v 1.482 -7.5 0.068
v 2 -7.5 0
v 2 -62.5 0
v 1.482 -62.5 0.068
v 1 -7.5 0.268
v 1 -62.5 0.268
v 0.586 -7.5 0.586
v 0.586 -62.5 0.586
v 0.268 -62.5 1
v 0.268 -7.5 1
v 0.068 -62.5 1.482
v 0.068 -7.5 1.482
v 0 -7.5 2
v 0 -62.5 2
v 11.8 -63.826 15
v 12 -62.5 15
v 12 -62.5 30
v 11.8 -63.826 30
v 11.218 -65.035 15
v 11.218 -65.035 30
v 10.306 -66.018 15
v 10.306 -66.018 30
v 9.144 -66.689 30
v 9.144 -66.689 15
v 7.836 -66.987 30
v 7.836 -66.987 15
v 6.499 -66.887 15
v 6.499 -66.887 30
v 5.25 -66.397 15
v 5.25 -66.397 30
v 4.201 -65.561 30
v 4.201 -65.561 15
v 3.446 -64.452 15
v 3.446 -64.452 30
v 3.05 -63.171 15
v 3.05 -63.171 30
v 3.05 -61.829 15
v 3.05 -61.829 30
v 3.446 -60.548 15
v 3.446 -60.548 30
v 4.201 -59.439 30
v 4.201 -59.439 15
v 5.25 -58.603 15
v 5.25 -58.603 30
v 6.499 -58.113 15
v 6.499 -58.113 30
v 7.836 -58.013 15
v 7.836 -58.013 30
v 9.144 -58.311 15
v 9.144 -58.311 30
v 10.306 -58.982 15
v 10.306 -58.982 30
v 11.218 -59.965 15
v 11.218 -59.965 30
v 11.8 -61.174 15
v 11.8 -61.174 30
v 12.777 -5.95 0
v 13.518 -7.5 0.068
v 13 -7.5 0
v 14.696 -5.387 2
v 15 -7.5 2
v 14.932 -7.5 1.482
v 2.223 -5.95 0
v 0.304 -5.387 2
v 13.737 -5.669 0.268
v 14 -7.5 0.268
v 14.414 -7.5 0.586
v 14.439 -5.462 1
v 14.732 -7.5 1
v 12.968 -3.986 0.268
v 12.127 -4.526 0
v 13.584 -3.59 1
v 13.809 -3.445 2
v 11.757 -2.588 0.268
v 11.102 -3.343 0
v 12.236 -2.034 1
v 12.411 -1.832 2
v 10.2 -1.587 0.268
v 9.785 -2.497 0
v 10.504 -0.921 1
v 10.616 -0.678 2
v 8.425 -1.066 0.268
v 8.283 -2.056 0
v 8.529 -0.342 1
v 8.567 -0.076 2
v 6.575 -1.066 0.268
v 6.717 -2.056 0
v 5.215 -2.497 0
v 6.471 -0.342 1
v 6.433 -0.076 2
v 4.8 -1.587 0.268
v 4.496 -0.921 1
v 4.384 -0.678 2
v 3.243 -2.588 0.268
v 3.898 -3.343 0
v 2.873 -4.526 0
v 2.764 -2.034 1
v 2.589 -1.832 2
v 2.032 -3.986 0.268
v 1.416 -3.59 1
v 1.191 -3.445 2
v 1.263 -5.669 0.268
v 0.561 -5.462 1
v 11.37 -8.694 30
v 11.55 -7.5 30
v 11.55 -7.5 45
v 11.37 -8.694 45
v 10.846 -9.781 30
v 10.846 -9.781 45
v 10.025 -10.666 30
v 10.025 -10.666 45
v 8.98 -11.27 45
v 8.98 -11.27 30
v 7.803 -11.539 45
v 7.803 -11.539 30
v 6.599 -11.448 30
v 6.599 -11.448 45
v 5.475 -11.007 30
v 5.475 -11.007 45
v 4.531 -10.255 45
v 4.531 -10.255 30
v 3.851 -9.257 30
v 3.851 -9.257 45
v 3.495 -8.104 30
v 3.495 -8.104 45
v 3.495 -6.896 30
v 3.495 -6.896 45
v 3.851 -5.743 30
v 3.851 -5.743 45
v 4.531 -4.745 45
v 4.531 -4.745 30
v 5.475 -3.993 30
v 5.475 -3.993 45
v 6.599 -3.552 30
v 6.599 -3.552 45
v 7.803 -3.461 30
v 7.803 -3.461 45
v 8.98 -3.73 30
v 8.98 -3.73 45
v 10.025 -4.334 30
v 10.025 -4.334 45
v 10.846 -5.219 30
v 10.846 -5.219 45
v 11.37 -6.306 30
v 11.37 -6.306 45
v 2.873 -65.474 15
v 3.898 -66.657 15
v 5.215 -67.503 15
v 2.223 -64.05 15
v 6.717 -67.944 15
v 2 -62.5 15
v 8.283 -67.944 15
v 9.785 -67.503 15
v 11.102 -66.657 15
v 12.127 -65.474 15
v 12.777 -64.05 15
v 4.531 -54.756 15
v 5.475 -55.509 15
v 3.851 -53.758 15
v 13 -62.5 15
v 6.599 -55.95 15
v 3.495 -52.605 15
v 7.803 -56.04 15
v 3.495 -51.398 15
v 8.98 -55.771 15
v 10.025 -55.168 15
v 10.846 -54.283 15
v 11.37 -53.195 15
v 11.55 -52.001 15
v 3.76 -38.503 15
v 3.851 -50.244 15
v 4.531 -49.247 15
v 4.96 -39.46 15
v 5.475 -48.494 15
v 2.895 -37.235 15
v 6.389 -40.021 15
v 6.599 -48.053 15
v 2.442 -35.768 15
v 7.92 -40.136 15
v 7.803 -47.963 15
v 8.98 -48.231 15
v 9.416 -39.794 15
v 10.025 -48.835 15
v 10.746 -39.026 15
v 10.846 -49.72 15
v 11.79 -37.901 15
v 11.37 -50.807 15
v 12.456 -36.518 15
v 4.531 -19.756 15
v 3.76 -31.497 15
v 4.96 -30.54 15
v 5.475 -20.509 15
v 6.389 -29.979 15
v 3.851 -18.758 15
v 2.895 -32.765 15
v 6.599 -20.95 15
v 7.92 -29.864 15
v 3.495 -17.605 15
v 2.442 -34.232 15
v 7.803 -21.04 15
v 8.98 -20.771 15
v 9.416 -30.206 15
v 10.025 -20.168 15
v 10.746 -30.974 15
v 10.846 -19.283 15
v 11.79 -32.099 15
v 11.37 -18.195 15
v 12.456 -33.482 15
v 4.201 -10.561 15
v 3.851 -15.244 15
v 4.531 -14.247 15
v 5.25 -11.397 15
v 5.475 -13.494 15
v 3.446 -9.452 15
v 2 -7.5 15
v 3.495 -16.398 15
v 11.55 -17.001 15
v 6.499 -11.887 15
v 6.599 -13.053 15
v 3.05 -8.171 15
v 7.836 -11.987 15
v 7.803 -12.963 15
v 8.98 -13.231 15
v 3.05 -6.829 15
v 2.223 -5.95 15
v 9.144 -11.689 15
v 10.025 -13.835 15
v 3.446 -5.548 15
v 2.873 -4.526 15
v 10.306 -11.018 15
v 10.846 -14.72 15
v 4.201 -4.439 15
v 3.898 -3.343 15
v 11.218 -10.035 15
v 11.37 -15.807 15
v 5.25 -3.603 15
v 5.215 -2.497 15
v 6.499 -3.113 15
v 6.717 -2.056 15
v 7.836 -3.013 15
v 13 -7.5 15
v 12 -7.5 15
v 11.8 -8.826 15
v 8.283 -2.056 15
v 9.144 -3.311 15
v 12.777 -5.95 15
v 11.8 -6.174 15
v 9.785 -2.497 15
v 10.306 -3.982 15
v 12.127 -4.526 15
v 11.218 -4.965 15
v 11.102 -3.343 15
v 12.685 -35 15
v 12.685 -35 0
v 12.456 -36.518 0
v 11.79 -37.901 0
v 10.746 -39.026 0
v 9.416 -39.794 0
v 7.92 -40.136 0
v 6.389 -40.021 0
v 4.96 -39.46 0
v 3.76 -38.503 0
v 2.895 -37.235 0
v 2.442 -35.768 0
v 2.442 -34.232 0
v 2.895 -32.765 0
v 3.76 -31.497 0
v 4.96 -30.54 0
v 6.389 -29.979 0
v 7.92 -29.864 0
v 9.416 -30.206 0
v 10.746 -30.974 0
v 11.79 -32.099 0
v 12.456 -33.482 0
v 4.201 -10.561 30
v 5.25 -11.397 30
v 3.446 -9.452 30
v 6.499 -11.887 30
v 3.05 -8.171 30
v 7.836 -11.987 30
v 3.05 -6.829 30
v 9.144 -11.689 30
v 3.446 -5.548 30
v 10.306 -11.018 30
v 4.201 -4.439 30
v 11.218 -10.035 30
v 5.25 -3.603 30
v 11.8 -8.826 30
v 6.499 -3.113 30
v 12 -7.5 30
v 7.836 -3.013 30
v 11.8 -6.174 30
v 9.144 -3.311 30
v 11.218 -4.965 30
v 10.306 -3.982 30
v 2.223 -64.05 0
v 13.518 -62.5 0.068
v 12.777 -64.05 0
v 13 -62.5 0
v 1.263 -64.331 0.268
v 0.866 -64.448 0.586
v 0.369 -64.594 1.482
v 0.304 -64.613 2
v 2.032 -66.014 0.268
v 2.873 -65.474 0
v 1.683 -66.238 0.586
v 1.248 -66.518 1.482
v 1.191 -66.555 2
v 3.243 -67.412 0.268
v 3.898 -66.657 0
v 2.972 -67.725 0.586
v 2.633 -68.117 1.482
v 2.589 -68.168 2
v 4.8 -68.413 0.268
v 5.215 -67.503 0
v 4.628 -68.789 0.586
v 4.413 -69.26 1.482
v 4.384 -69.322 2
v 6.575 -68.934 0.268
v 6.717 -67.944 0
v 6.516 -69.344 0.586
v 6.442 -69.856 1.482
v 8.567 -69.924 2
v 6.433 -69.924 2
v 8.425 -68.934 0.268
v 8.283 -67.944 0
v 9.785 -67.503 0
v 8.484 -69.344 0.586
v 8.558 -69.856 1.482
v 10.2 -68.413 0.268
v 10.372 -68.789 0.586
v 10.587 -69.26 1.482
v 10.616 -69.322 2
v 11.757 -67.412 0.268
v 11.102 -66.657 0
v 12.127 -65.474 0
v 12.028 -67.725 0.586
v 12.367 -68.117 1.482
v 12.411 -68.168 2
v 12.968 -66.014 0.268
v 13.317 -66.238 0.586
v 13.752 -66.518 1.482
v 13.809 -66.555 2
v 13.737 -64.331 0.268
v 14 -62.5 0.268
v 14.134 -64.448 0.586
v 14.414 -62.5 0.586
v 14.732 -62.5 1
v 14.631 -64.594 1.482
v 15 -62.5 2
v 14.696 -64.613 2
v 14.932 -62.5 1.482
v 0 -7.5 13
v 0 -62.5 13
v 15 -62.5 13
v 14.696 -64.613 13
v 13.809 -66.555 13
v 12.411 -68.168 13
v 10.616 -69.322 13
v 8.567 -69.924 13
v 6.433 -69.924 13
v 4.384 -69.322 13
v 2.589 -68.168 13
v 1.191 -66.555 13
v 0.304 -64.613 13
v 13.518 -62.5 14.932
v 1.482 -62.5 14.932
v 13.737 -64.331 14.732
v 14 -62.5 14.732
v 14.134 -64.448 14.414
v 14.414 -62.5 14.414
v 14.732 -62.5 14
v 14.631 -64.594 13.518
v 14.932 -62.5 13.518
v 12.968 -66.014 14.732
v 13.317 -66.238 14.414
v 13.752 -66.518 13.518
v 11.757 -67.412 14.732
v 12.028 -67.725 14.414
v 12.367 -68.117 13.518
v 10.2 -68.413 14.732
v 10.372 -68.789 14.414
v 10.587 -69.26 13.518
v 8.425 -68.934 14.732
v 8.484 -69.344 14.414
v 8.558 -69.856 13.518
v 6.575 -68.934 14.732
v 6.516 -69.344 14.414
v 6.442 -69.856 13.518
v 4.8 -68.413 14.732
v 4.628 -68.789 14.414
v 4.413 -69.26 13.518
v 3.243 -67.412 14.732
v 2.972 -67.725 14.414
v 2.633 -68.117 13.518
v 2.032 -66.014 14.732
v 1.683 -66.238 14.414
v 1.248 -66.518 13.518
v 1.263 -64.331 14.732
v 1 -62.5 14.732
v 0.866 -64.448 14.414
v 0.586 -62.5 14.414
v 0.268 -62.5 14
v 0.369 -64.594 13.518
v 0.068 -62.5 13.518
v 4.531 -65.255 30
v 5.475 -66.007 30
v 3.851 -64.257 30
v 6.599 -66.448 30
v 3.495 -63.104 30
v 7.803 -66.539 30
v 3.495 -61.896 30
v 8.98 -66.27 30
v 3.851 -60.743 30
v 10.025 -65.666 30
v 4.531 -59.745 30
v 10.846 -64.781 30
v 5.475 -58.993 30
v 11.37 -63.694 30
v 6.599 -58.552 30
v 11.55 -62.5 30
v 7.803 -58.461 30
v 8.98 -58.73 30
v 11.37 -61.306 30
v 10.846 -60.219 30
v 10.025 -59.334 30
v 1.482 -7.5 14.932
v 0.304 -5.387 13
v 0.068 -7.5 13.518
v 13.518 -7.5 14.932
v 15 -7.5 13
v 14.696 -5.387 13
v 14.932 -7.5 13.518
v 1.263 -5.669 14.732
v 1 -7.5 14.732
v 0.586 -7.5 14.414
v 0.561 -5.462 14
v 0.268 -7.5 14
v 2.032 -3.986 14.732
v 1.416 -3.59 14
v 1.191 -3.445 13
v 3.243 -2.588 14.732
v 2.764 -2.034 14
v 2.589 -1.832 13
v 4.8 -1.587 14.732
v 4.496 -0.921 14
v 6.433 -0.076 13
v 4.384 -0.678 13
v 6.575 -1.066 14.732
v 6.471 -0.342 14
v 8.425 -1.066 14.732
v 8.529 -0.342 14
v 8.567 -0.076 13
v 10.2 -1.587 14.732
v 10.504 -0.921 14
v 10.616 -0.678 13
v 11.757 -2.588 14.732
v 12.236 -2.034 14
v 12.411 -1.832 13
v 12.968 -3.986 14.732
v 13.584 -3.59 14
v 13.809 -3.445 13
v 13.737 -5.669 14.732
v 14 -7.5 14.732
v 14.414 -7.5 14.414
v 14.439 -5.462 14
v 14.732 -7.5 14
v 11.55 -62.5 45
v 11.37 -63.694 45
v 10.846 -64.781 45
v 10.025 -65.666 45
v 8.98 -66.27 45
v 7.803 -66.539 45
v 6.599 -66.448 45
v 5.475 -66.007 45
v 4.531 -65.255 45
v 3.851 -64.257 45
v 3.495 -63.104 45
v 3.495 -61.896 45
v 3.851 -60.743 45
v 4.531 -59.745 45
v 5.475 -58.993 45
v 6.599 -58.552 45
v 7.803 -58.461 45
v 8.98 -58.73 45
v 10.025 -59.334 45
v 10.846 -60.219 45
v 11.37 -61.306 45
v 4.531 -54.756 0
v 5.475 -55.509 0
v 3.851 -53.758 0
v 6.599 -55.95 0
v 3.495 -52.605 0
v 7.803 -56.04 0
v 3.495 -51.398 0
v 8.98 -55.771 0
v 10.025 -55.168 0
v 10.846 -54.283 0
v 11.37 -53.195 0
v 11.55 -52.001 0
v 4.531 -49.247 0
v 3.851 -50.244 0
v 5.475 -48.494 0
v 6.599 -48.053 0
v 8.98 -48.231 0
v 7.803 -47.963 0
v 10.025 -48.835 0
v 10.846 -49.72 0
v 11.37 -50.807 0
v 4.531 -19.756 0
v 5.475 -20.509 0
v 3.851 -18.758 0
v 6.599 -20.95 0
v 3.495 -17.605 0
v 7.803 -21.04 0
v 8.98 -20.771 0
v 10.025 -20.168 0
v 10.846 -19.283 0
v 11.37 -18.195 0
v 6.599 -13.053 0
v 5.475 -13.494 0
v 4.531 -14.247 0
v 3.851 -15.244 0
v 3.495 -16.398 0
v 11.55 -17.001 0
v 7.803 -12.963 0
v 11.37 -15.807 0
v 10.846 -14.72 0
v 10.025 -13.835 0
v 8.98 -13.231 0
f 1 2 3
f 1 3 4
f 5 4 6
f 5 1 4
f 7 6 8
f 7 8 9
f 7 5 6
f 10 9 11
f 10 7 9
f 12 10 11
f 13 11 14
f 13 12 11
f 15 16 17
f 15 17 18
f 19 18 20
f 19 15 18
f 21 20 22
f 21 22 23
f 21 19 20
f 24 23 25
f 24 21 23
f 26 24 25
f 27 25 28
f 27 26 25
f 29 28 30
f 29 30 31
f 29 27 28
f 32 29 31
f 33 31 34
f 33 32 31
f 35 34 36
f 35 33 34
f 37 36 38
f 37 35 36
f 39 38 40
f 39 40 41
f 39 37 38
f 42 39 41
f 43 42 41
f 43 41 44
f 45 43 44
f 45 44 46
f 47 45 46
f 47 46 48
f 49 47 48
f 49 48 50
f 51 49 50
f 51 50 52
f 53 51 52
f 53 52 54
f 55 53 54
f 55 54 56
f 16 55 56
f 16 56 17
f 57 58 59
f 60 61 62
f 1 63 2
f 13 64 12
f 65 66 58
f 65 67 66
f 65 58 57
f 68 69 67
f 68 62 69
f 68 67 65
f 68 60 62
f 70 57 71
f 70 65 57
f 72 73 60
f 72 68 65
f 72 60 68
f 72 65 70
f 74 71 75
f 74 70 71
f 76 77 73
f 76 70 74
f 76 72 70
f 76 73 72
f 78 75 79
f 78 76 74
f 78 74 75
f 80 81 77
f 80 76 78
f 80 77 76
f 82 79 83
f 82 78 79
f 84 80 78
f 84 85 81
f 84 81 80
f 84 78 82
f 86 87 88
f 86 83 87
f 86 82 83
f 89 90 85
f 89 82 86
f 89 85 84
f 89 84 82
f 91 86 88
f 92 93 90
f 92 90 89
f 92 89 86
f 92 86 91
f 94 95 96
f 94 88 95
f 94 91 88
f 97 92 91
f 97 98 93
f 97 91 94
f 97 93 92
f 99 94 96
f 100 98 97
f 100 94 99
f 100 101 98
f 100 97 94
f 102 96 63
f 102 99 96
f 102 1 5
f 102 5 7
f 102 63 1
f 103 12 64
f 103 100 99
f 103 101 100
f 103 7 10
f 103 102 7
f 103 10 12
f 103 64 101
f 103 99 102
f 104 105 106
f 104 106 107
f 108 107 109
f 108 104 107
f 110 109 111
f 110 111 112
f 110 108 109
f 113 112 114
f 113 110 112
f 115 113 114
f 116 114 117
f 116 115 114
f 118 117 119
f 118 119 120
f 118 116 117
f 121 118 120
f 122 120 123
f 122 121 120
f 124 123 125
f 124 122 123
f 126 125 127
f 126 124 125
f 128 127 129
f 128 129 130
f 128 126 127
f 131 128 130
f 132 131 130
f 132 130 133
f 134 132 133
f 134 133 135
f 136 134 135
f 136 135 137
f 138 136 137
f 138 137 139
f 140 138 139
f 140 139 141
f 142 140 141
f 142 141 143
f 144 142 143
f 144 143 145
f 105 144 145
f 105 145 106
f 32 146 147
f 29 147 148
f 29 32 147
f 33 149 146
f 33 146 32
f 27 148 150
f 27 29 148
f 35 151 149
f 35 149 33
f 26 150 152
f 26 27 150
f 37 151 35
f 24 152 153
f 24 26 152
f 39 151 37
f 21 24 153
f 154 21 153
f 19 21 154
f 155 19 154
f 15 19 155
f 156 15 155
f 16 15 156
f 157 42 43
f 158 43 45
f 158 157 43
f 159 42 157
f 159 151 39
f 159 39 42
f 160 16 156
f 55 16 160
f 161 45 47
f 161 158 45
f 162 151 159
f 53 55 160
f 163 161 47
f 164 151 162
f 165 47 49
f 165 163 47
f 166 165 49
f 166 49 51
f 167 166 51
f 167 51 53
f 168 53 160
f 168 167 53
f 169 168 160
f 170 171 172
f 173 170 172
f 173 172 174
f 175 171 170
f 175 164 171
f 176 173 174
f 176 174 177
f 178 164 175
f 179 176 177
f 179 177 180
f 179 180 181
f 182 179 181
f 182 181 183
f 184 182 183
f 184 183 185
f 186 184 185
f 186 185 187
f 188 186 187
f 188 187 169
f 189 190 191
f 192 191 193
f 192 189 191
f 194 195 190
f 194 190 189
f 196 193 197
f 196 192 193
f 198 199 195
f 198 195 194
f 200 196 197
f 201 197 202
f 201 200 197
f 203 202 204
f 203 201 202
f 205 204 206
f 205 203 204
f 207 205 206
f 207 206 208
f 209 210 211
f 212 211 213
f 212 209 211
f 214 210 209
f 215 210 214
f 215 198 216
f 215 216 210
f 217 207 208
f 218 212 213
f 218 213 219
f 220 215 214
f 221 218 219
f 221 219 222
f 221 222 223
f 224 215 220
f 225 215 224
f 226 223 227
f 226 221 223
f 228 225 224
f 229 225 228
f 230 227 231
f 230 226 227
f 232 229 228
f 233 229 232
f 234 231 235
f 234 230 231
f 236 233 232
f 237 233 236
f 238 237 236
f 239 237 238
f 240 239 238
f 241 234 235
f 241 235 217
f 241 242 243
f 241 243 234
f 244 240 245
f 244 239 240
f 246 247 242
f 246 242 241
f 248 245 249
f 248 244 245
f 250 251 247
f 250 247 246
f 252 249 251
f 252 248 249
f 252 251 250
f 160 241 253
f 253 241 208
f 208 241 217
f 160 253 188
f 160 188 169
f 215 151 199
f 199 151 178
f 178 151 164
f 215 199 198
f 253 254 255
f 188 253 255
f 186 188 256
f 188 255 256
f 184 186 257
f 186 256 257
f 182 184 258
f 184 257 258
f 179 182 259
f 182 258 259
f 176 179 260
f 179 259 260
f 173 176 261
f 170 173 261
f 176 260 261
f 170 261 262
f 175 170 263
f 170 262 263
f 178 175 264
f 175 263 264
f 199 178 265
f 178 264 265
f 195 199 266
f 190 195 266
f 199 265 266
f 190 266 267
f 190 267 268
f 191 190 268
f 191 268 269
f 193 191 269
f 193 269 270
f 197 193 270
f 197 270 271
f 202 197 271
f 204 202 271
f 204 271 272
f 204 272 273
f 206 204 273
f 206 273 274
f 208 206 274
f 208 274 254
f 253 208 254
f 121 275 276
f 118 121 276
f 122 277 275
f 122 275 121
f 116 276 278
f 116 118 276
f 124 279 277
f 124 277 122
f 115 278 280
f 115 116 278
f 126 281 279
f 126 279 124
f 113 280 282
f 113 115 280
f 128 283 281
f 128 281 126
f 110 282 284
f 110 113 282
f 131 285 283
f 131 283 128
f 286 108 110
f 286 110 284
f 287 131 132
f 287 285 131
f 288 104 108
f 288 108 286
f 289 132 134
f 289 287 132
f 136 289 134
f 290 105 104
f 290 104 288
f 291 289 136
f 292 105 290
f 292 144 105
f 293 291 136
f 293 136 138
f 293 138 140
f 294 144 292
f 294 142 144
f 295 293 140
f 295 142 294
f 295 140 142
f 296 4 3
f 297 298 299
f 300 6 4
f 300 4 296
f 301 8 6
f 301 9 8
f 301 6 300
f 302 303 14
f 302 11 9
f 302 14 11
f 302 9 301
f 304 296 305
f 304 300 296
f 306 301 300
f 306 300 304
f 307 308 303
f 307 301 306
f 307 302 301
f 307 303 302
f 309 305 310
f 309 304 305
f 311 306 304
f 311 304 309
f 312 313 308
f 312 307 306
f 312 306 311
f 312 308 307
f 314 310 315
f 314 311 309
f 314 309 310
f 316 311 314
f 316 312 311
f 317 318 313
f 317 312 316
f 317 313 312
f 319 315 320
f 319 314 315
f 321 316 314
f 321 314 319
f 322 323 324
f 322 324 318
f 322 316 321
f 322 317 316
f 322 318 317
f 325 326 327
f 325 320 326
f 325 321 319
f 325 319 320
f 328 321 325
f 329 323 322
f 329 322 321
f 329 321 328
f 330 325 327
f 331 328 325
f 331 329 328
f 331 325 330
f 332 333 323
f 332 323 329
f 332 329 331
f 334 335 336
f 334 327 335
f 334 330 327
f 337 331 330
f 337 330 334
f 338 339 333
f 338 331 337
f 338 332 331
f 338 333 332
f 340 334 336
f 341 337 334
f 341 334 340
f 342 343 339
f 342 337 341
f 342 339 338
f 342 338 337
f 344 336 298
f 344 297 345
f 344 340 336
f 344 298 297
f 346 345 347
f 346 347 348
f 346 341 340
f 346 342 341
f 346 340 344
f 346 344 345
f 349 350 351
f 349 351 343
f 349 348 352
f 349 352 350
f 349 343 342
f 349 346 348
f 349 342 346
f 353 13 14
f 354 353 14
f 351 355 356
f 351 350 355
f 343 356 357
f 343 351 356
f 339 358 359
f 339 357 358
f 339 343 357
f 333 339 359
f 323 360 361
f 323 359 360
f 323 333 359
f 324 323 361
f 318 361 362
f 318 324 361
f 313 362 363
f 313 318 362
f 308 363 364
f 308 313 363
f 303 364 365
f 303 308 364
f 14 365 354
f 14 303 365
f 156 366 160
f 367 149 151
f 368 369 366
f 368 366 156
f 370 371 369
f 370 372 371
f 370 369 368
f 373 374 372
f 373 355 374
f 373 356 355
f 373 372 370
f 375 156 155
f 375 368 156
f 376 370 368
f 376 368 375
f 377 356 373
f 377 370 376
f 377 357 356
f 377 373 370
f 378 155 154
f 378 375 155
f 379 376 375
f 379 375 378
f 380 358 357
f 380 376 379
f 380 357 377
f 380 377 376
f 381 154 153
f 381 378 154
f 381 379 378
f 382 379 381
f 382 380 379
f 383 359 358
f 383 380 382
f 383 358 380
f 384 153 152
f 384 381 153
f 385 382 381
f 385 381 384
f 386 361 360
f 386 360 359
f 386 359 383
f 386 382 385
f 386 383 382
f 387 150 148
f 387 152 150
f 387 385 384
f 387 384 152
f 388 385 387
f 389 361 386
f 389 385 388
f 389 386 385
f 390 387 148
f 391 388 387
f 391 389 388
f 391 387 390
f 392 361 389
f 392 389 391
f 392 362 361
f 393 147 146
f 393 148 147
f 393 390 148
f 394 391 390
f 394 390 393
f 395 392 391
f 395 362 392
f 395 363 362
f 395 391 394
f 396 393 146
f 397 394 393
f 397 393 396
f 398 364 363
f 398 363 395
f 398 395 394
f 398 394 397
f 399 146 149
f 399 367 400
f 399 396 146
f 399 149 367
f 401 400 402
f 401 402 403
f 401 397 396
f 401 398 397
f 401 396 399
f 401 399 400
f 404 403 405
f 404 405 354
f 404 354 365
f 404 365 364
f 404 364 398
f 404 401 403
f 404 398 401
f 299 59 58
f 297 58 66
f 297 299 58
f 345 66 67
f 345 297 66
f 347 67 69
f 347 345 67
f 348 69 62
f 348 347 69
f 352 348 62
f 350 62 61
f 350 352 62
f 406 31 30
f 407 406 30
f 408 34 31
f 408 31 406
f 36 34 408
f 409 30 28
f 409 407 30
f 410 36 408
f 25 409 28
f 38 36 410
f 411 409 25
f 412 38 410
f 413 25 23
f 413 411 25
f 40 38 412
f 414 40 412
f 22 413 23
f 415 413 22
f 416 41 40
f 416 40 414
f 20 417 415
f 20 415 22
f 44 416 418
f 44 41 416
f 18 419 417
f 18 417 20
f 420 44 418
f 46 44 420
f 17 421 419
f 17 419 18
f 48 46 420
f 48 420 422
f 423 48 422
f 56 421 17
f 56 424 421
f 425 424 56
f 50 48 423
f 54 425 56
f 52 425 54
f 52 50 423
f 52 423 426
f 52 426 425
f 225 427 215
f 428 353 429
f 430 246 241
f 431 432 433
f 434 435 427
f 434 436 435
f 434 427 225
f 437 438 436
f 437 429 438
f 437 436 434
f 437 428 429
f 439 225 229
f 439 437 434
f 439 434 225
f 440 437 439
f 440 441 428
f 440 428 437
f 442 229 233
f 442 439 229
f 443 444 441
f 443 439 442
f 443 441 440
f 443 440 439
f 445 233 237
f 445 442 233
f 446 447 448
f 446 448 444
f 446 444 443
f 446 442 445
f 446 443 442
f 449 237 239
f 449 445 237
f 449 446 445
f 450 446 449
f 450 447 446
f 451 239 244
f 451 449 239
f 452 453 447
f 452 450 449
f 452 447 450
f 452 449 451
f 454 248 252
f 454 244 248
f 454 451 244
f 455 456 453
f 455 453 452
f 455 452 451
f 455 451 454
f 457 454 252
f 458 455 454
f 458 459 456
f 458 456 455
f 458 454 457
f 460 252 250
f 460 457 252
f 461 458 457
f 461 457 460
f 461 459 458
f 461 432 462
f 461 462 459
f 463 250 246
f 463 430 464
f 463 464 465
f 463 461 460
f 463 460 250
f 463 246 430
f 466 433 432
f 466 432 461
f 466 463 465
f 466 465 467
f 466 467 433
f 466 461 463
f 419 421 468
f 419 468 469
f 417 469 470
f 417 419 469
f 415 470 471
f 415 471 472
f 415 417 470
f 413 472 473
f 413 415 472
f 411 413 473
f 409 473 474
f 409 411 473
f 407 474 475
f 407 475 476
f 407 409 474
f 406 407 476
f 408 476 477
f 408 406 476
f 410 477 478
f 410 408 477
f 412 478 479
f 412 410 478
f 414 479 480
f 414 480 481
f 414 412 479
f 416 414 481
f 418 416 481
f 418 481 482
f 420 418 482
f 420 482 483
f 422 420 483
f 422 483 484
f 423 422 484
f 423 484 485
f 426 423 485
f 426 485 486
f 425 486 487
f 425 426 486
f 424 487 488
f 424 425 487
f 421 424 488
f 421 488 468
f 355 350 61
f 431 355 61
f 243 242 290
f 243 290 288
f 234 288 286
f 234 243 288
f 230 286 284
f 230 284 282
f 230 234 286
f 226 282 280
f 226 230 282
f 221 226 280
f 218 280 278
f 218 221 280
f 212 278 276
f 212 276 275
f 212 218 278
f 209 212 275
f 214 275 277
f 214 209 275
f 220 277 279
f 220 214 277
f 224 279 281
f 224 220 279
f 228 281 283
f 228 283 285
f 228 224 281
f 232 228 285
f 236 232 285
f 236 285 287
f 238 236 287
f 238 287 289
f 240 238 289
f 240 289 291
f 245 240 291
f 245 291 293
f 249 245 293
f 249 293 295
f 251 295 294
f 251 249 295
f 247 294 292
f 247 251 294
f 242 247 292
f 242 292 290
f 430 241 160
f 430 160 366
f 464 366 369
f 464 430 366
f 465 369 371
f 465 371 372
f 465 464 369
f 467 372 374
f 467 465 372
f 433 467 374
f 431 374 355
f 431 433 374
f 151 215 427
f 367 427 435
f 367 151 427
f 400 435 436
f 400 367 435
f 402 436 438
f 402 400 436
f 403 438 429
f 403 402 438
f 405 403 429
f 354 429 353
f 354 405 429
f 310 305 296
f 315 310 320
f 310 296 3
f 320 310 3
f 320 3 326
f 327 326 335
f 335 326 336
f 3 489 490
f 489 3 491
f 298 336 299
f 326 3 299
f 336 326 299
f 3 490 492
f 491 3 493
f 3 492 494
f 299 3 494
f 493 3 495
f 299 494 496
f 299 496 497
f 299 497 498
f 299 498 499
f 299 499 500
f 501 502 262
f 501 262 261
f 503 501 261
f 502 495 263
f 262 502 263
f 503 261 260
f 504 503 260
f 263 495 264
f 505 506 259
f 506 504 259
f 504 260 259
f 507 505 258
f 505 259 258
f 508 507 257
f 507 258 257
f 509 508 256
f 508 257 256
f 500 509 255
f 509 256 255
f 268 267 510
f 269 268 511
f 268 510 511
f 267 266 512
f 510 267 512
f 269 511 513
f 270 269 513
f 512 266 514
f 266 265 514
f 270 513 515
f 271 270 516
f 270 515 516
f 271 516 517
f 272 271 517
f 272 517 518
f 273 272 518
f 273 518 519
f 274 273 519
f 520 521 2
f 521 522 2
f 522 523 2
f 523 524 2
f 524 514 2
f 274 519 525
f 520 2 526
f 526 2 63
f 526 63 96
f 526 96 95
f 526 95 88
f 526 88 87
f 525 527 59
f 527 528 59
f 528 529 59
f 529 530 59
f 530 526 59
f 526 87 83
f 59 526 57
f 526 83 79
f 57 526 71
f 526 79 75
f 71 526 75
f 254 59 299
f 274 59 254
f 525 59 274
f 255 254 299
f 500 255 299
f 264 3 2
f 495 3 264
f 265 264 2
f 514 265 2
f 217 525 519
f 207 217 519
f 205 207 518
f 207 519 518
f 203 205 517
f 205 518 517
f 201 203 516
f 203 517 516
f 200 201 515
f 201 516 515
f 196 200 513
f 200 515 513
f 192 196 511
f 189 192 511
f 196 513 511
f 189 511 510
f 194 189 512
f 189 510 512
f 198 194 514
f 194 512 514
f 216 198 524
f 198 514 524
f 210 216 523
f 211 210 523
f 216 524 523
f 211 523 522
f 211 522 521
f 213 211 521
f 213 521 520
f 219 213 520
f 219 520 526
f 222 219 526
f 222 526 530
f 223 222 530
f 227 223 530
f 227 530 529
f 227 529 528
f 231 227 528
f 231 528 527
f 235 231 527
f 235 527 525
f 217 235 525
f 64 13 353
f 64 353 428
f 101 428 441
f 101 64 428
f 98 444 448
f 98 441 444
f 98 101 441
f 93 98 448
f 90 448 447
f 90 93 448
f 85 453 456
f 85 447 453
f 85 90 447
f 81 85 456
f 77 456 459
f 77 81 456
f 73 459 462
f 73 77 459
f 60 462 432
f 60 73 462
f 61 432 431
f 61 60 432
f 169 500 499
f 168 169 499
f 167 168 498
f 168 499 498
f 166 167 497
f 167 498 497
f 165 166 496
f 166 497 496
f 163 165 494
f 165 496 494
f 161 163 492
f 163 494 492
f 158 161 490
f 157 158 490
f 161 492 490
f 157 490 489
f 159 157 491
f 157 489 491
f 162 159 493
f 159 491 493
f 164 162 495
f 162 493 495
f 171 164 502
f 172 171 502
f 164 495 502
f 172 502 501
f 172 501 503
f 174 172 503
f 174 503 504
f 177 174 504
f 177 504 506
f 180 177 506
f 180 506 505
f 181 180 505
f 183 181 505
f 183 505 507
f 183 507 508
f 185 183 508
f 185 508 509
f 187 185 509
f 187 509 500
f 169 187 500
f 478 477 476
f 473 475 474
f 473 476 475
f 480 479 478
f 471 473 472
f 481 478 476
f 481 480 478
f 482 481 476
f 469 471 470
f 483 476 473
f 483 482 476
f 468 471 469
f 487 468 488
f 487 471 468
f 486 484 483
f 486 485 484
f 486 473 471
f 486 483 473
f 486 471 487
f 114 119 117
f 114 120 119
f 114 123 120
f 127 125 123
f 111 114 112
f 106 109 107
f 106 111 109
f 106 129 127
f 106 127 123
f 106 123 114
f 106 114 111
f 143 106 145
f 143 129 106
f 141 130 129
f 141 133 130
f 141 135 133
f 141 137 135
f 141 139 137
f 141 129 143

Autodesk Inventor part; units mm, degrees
ref_plane "YZ Plane" through (0, 0, 0) normal (1, 0, 0) x (0, 1, 0)
ref_plane "XZ Plane" through (0, 0, 0) normal (0, 1, 0) x (-1, 0, 0)
ref_plane "XY Plane" through (0, 0, 0) normal (0, 0, 1) x (1, 0, 0)
sketch "Sketch1" plane through (0, 0, 0) normal (0, 0, 1) x (1, 0, 0)
  line L0 (0, -70) -> (15, -70)
  line L1 (15, -70) -> (15, 0)
  line L2 (15, 0) -> (0, 0)
  line L3 (0, 0) -> (0, -70)
  line L4 (15, -35) -> (0, -35)
  line L5 (0, -9.5012) -> (15, -9.5012)
  line L6 (15, -9.5012) -> (15, -59.5012)
  line L7 (15, -59.5012) -> (0, -59.5012)
  line L8 (0, -59.5012) -> (0, -9.5012)
  line L9 (0, -9.5012) -> (15, -59.5012) construction
  line L10 (15, -9.5012) -> (0, -59.5012) construction
  line L11 (7.5, -34.5012) -> (7.5349, -35)
  circle A0 centre (7.5349, -35) radius 5.15
  line L12 (0, -70) -> (15, -70)
  line L13 (15, -70) -> (15, -55)
  line L14 (15, -55) -> (0, -55) construction
  line L15 (0, -55) -> (0, -70)
  line L16 (0, 0) -> (15, 0)
  line L17 (15, 0) -> (15, -15)
  line L18 (15, -15) -> (0, -15) construction
  line L19 (0, -15) -> (0, 0)
  line L20 (15, -55) -> (0, -70) construction
  line L21 (0, 0) -> (15, -15) construction
  circle A1 centre (7.5, -62.5) radius 7.5
  circle A2 centre (7.5, -7.5) radius 7.5
  line L22 (0, -59.5012) -> (15, -59.5012)
  line L23 (15, -59.5012) -> (15, -44.5012)
  line L24 (15, -44.5012) -> (0, -44.5012)
  line L25 (0, -44.5012) -> (0, -59.5012)
  line L26 (15, -9.5012) -> (0, -9.5012)
  line L27 (0, -9.5012) -> (0, -24.5012)
  line L28 (0, -24.5012) -> (15, -24.5012)
  line L29 (15, -24.5012) -> (15, -9.5012)
  line L30 (0, -24.5012) -> (15, -9.5012) construction
  line L31 (0, -59.5012) -> (15, -44.5012) construction
  circle A3 centre (7.5, -52.0012) radius 4.05
  circle A4 centre (7.5, -17.0012) radius 4.05
  circle A5 centre (7.5, -62.5) radius 4.05
  circle A6 centre (7.5, -7.5) radius 4.05
  circle A7 centre (7.5, -7.5) radius 4.5
  circle A8 centre (7.5, -62.5) radius 4.5
  point P0 (15, -7.5)
  point P1 (0, -7.5)
  point P2 (0, -62.5)
  point P3 (15, -62.5)
  dimension "d0" = 15
  dimension "d1" = 70
  dimension "d2" = 15
  dimension "d3" = 50
  dimension "d4" = 0.5
  dimension "d5" = 10.3
  dimension "d6" = 15
  dimension "d7" = 15
  dimension "d8" = 15
  dimension "d9" = 15
  dimension "d10" = 15
  dimension "d11" = 15
  dimension "d12" = 15
  dimension "d14" = 8.1
  dimension "d15" = 8.1
  dimension "d16" = 8.1
  dimension "d17" = 8.1
  dimension "d18" = 15
  dimension "d19" = 0
  dimension "d20" = 0
  dimension "d27" = 9
  dimension "d28" = 9
extrude "Extrusion1" add sketch "Sketch1" along normal blind 15 contours A1 L7 A8 | L3 L7 A1 | A1 L7 L1 | L3 L24 L1 L7 A1 A3 | A1 A3 L7 A8 | A8 L7 A5 | L7 A5 A8 | A3 A1 | A1 A3 | L3 L4 A0 L1 L24 | L3 L28 L1 L4 A0 | L3 L5 A2 A4 L1 L28 | L3 A2 L5 | L5 A2 L1 | A2 L5 A7 | L5 A7 A2 A4 | A7 L5 A6 | L5 A6 A7 | A4 A2 | A2 A4
extrude "Extrusion2" add sketch "Sketch1" along normal blind 45 contours A5 L7 | L7 A5 | A6 L5 | L5 A6
extrude "Extrusion3" cut sketch "Sketch1" along normal blind 15 contours A3 A1 | A1 A3 | A4 A2 | A2 A4
extrude "Extrusion4" add sketch "Sketch1" along normal blind 30 contours A8 L7 A5 | L7 A5 A8 | A5 L7 | L7 A5 | A7 L5 A6 | L5 A6 A7 | A6 L5 | L5 A6
fillet "Fillet1" radius 2 8 edges at (7.5, 0, 15) (0, -35, 15) (7.5, -70, 15) (15, -35, 15) (7.5, 0, 0) (0, -35, 0) (7.5, -70, 0) (15, -35, 0)
properties part number "Gear_Holder_2"
